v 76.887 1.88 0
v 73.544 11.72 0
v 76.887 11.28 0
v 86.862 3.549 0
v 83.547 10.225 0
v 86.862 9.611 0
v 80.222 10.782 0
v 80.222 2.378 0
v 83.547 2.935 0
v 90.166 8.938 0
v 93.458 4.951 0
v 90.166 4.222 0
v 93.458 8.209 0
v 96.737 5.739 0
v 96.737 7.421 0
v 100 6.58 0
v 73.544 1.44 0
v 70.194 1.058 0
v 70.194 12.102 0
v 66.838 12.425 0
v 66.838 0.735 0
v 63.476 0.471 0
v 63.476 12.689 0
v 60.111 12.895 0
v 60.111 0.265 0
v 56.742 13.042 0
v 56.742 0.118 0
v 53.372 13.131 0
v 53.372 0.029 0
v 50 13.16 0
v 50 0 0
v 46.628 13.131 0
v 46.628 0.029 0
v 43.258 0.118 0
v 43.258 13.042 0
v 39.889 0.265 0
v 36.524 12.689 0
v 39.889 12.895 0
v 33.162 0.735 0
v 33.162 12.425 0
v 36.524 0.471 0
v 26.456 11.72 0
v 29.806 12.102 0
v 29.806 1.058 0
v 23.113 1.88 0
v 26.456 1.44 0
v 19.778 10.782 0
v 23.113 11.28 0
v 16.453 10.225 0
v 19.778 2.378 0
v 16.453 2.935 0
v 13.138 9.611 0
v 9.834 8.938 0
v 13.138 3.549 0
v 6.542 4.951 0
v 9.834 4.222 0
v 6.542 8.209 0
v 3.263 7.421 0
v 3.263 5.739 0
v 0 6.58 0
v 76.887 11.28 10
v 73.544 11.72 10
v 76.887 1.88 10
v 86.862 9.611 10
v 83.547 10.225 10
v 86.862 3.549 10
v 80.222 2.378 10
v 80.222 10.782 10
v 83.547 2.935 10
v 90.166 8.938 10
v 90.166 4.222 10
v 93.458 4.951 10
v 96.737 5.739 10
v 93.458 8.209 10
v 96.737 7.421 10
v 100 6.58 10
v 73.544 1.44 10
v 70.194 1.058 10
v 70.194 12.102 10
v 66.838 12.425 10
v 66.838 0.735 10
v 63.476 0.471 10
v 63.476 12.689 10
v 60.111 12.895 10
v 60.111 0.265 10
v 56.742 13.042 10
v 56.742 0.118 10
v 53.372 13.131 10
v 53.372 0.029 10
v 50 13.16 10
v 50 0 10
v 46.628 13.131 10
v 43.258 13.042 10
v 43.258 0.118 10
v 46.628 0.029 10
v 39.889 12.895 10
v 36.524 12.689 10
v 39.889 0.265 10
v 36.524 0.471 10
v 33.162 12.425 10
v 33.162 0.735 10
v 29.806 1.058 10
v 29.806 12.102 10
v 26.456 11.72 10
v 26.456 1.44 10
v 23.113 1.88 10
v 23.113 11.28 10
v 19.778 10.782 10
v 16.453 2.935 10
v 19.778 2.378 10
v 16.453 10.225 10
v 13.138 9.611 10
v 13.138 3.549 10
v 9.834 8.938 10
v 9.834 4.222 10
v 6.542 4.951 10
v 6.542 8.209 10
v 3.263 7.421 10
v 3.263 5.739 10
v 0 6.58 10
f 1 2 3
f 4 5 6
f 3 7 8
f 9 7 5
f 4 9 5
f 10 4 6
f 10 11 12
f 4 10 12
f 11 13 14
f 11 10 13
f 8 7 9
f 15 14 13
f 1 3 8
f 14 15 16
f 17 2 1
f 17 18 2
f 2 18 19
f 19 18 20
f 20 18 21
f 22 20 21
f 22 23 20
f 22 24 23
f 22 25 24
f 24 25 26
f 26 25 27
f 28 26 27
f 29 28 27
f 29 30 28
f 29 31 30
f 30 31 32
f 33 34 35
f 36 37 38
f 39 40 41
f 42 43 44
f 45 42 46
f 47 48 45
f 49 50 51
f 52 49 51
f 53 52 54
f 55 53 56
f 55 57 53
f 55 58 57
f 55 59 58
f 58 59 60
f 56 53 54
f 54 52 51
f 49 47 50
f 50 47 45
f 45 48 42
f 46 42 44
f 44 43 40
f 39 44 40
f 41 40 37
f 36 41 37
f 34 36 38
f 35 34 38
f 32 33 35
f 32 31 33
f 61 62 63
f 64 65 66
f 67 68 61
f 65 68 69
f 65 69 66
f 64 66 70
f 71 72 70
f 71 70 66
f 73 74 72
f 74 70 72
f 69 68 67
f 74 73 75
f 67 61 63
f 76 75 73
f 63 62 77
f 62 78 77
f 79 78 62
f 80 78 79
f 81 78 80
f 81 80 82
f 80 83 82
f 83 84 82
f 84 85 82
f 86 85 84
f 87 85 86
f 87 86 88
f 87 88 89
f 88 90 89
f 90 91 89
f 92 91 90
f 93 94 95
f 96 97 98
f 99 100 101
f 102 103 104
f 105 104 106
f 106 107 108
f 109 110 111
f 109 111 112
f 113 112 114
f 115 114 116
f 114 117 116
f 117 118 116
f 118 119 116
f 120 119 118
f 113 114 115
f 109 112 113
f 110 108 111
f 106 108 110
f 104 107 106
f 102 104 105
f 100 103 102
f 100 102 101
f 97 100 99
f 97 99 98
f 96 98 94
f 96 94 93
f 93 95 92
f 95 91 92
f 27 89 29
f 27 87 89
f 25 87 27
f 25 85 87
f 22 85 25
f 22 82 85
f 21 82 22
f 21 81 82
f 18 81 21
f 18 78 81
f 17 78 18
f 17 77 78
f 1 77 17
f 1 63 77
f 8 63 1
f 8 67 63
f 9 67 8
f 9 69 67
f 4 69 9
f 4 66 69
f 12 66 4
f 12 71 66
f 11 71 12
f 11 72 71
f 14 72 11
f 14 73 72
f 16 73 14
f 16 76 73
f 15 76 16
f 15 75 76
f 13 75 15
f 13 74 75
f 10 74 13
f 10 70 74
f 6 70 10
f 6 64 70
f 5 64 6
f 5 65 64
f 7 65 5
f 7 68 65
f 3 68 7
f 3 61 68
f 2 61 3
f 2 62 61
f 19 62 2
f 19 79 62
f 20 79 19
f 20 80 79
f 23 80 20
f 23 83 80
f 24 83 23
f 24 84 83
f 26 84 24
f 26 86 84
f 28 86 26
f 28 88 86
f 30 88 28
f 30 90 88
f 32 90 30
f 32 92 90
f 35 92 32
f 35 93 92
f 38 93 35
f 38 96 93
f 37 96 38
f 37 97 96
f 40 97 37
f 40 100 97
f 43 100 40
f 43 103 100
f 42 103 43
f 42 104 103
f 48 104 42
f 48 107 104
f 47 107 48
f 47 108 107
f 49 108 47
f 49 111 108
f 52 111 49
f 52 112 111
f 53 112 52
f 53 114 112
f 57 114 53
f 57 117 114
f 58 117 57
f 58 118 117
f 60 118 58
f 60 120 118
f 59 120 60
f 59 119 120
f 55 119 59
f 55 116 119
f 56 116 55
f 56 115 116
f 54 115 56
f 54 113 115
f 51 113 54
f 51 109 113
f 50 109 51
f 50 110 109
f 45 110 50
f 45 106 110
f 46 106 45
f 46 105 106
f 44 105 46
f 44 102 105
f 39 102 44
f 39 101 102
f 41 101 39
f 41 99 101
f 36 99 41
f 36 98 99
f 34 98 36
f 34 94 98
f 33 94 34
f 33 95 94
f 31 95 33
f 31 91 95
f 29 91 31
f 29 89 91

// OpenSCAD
$fn = 32;

// ----------------------------------------------------------------------
// Arc profile plate: lens, 60 points
// ----------------------------------------------------------------------

// --- parameters (mm) ---
lens_chord = 100;         // chord length of the lens, X
arc_r = 193.19;           // radius of both arcs
arc_angle = 30;           // angle of each arc, degrees
sagitta = 6.58;           // bulge of each arc (half the lens height)
arc_step = 1;             // sampling step of the arcs, degrees
plate_t = 10;             // plate thickness, Z

bbox_y = 2 * sagitta;  // full lens height

profile = [[100, 6.58], [96.737, 7.421], [93.458, 8.209], [90.166, 8.938], [86.862, 9.611], [83.547, 10.225], [80.222, 10.782], [76.887, 11.28], [73.544, 11.72], [70.194, 12.102], [66.838, 12.425], [63.476, 12.689], [60.111, 12.895], [56.742, 13.042], [53.372, 13.131], [50, 13.16], [46.628, 13.131], [43.258, 13.042], [39.889, 12.895], [36.524, 12.689], [33.162, 12.425], [29.806, 12.102], [26.456, 11.72], [23.113, 11.28], [19.778, 10.782], [16.453, 10.225], [13.138, 9.611], [9.834, 8.938], [6.542, 8.209], [3.263, 7.421], [0, 6.58], [3.263, 5.739], [6.542, 4.951], [9.834, 4.222], [13.138, 3.549], [16.453, 2.935], [19.778, 2.378], [23.113, 1.88], [26.456, 1.44], [29.806, 1.058], [33.162, 0.735], [36.524, 0.471], [39.889, 0.265], [43.258, 0.118], [46.628, 0.029], [50, 0], [53.372, 0.029], [56.742, 0.118], [60.111, 0.265], [63.476, 0.471], [66.838, 0.735], [70.194, 1.058], [73.544, 1.44], [76.887, 1.88], [80.222, 2.378], [83.547, 2.935], [86.862, 3.549], [90.166, 4.222], [93.458, 4.951], [96.737, 5.739]];  // primary outline, 60 points, counter clockwise

// --- the one profile operation ---
linear_extrude(height = plate_t) polygon(points = profile);
